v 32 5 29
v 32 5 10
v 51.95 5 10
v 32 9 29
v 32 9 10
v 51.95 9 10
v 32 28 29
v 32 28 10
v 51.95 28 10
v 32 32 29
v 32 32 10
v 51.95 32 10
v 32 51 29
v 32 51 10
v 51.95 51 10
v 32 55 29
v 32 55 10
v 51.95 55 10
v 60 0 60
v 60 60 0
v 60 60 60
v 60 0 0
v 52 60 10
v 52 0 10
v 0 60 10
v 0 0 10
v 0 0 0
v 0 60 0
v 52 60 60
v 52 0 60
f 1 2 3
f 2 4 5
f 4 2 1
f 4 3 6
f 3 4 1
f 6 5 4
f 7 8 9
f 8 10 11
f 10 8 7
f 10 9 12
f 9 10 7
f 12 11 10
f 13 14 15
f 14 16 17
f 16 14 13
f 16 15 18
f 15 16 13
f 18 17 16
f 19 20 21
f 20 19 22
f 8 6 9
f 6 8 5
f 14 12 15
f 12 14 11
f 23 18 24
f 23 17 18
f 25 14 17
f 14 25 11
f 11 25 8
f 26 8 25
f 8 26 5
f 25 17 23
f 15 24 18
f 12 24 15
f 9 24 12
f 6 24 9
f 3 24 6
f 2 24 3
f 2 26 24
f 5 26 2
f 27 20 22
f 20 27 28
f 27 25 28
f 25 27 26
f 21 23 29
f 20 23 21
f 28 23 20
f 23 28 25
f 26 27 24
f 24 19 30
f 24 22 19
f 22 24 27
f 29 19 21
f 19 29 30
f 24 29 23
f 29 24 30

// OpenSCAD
$fn = 32;

// ----------------------------------------------------------------------
// Rib bracket: 3-gusset L bracket
// ----------------------------------------------------------------------

// --- parameters (mm) ---
base_l = 60;              // foot length, X
base_w = 60;              // foot width, Y
base_t = 10;              // foot thickness
plate_t = 8;              // upright plate thickness
plate_h = 60;             // overall height
gus_l = 20;               // gusset leg along the foot
gus_h = 20;               // gusset height
gus_t = 4;                // gusset thickness
gus_edge = 5;             // gusset margin from the foot edge
n_gus = 3;                // gusset count

gus_pitch = (base_w - 2 * gus_edge - gus_t) / (n_gus - 1);  // gusset pitch

union() {
  cube([base_l, base_w, base_t]);
  translate([base_l - plate_t, 0, base_t - 1])
    cube([plate_t, base_w, plate_h - base_t + 1]);
  for (i = [0 : n_gus - 1])
    translate([base_l - plate_t - gus_l, gus_edge + i * gus_pitch, base_t - 1])
      rotate([-90, 0, 0])
        linear_extrude(height = gus_t)
          polygon(points = [[0, 0], [gus_l + 1, 0], [0, -gus_h]]);
}
